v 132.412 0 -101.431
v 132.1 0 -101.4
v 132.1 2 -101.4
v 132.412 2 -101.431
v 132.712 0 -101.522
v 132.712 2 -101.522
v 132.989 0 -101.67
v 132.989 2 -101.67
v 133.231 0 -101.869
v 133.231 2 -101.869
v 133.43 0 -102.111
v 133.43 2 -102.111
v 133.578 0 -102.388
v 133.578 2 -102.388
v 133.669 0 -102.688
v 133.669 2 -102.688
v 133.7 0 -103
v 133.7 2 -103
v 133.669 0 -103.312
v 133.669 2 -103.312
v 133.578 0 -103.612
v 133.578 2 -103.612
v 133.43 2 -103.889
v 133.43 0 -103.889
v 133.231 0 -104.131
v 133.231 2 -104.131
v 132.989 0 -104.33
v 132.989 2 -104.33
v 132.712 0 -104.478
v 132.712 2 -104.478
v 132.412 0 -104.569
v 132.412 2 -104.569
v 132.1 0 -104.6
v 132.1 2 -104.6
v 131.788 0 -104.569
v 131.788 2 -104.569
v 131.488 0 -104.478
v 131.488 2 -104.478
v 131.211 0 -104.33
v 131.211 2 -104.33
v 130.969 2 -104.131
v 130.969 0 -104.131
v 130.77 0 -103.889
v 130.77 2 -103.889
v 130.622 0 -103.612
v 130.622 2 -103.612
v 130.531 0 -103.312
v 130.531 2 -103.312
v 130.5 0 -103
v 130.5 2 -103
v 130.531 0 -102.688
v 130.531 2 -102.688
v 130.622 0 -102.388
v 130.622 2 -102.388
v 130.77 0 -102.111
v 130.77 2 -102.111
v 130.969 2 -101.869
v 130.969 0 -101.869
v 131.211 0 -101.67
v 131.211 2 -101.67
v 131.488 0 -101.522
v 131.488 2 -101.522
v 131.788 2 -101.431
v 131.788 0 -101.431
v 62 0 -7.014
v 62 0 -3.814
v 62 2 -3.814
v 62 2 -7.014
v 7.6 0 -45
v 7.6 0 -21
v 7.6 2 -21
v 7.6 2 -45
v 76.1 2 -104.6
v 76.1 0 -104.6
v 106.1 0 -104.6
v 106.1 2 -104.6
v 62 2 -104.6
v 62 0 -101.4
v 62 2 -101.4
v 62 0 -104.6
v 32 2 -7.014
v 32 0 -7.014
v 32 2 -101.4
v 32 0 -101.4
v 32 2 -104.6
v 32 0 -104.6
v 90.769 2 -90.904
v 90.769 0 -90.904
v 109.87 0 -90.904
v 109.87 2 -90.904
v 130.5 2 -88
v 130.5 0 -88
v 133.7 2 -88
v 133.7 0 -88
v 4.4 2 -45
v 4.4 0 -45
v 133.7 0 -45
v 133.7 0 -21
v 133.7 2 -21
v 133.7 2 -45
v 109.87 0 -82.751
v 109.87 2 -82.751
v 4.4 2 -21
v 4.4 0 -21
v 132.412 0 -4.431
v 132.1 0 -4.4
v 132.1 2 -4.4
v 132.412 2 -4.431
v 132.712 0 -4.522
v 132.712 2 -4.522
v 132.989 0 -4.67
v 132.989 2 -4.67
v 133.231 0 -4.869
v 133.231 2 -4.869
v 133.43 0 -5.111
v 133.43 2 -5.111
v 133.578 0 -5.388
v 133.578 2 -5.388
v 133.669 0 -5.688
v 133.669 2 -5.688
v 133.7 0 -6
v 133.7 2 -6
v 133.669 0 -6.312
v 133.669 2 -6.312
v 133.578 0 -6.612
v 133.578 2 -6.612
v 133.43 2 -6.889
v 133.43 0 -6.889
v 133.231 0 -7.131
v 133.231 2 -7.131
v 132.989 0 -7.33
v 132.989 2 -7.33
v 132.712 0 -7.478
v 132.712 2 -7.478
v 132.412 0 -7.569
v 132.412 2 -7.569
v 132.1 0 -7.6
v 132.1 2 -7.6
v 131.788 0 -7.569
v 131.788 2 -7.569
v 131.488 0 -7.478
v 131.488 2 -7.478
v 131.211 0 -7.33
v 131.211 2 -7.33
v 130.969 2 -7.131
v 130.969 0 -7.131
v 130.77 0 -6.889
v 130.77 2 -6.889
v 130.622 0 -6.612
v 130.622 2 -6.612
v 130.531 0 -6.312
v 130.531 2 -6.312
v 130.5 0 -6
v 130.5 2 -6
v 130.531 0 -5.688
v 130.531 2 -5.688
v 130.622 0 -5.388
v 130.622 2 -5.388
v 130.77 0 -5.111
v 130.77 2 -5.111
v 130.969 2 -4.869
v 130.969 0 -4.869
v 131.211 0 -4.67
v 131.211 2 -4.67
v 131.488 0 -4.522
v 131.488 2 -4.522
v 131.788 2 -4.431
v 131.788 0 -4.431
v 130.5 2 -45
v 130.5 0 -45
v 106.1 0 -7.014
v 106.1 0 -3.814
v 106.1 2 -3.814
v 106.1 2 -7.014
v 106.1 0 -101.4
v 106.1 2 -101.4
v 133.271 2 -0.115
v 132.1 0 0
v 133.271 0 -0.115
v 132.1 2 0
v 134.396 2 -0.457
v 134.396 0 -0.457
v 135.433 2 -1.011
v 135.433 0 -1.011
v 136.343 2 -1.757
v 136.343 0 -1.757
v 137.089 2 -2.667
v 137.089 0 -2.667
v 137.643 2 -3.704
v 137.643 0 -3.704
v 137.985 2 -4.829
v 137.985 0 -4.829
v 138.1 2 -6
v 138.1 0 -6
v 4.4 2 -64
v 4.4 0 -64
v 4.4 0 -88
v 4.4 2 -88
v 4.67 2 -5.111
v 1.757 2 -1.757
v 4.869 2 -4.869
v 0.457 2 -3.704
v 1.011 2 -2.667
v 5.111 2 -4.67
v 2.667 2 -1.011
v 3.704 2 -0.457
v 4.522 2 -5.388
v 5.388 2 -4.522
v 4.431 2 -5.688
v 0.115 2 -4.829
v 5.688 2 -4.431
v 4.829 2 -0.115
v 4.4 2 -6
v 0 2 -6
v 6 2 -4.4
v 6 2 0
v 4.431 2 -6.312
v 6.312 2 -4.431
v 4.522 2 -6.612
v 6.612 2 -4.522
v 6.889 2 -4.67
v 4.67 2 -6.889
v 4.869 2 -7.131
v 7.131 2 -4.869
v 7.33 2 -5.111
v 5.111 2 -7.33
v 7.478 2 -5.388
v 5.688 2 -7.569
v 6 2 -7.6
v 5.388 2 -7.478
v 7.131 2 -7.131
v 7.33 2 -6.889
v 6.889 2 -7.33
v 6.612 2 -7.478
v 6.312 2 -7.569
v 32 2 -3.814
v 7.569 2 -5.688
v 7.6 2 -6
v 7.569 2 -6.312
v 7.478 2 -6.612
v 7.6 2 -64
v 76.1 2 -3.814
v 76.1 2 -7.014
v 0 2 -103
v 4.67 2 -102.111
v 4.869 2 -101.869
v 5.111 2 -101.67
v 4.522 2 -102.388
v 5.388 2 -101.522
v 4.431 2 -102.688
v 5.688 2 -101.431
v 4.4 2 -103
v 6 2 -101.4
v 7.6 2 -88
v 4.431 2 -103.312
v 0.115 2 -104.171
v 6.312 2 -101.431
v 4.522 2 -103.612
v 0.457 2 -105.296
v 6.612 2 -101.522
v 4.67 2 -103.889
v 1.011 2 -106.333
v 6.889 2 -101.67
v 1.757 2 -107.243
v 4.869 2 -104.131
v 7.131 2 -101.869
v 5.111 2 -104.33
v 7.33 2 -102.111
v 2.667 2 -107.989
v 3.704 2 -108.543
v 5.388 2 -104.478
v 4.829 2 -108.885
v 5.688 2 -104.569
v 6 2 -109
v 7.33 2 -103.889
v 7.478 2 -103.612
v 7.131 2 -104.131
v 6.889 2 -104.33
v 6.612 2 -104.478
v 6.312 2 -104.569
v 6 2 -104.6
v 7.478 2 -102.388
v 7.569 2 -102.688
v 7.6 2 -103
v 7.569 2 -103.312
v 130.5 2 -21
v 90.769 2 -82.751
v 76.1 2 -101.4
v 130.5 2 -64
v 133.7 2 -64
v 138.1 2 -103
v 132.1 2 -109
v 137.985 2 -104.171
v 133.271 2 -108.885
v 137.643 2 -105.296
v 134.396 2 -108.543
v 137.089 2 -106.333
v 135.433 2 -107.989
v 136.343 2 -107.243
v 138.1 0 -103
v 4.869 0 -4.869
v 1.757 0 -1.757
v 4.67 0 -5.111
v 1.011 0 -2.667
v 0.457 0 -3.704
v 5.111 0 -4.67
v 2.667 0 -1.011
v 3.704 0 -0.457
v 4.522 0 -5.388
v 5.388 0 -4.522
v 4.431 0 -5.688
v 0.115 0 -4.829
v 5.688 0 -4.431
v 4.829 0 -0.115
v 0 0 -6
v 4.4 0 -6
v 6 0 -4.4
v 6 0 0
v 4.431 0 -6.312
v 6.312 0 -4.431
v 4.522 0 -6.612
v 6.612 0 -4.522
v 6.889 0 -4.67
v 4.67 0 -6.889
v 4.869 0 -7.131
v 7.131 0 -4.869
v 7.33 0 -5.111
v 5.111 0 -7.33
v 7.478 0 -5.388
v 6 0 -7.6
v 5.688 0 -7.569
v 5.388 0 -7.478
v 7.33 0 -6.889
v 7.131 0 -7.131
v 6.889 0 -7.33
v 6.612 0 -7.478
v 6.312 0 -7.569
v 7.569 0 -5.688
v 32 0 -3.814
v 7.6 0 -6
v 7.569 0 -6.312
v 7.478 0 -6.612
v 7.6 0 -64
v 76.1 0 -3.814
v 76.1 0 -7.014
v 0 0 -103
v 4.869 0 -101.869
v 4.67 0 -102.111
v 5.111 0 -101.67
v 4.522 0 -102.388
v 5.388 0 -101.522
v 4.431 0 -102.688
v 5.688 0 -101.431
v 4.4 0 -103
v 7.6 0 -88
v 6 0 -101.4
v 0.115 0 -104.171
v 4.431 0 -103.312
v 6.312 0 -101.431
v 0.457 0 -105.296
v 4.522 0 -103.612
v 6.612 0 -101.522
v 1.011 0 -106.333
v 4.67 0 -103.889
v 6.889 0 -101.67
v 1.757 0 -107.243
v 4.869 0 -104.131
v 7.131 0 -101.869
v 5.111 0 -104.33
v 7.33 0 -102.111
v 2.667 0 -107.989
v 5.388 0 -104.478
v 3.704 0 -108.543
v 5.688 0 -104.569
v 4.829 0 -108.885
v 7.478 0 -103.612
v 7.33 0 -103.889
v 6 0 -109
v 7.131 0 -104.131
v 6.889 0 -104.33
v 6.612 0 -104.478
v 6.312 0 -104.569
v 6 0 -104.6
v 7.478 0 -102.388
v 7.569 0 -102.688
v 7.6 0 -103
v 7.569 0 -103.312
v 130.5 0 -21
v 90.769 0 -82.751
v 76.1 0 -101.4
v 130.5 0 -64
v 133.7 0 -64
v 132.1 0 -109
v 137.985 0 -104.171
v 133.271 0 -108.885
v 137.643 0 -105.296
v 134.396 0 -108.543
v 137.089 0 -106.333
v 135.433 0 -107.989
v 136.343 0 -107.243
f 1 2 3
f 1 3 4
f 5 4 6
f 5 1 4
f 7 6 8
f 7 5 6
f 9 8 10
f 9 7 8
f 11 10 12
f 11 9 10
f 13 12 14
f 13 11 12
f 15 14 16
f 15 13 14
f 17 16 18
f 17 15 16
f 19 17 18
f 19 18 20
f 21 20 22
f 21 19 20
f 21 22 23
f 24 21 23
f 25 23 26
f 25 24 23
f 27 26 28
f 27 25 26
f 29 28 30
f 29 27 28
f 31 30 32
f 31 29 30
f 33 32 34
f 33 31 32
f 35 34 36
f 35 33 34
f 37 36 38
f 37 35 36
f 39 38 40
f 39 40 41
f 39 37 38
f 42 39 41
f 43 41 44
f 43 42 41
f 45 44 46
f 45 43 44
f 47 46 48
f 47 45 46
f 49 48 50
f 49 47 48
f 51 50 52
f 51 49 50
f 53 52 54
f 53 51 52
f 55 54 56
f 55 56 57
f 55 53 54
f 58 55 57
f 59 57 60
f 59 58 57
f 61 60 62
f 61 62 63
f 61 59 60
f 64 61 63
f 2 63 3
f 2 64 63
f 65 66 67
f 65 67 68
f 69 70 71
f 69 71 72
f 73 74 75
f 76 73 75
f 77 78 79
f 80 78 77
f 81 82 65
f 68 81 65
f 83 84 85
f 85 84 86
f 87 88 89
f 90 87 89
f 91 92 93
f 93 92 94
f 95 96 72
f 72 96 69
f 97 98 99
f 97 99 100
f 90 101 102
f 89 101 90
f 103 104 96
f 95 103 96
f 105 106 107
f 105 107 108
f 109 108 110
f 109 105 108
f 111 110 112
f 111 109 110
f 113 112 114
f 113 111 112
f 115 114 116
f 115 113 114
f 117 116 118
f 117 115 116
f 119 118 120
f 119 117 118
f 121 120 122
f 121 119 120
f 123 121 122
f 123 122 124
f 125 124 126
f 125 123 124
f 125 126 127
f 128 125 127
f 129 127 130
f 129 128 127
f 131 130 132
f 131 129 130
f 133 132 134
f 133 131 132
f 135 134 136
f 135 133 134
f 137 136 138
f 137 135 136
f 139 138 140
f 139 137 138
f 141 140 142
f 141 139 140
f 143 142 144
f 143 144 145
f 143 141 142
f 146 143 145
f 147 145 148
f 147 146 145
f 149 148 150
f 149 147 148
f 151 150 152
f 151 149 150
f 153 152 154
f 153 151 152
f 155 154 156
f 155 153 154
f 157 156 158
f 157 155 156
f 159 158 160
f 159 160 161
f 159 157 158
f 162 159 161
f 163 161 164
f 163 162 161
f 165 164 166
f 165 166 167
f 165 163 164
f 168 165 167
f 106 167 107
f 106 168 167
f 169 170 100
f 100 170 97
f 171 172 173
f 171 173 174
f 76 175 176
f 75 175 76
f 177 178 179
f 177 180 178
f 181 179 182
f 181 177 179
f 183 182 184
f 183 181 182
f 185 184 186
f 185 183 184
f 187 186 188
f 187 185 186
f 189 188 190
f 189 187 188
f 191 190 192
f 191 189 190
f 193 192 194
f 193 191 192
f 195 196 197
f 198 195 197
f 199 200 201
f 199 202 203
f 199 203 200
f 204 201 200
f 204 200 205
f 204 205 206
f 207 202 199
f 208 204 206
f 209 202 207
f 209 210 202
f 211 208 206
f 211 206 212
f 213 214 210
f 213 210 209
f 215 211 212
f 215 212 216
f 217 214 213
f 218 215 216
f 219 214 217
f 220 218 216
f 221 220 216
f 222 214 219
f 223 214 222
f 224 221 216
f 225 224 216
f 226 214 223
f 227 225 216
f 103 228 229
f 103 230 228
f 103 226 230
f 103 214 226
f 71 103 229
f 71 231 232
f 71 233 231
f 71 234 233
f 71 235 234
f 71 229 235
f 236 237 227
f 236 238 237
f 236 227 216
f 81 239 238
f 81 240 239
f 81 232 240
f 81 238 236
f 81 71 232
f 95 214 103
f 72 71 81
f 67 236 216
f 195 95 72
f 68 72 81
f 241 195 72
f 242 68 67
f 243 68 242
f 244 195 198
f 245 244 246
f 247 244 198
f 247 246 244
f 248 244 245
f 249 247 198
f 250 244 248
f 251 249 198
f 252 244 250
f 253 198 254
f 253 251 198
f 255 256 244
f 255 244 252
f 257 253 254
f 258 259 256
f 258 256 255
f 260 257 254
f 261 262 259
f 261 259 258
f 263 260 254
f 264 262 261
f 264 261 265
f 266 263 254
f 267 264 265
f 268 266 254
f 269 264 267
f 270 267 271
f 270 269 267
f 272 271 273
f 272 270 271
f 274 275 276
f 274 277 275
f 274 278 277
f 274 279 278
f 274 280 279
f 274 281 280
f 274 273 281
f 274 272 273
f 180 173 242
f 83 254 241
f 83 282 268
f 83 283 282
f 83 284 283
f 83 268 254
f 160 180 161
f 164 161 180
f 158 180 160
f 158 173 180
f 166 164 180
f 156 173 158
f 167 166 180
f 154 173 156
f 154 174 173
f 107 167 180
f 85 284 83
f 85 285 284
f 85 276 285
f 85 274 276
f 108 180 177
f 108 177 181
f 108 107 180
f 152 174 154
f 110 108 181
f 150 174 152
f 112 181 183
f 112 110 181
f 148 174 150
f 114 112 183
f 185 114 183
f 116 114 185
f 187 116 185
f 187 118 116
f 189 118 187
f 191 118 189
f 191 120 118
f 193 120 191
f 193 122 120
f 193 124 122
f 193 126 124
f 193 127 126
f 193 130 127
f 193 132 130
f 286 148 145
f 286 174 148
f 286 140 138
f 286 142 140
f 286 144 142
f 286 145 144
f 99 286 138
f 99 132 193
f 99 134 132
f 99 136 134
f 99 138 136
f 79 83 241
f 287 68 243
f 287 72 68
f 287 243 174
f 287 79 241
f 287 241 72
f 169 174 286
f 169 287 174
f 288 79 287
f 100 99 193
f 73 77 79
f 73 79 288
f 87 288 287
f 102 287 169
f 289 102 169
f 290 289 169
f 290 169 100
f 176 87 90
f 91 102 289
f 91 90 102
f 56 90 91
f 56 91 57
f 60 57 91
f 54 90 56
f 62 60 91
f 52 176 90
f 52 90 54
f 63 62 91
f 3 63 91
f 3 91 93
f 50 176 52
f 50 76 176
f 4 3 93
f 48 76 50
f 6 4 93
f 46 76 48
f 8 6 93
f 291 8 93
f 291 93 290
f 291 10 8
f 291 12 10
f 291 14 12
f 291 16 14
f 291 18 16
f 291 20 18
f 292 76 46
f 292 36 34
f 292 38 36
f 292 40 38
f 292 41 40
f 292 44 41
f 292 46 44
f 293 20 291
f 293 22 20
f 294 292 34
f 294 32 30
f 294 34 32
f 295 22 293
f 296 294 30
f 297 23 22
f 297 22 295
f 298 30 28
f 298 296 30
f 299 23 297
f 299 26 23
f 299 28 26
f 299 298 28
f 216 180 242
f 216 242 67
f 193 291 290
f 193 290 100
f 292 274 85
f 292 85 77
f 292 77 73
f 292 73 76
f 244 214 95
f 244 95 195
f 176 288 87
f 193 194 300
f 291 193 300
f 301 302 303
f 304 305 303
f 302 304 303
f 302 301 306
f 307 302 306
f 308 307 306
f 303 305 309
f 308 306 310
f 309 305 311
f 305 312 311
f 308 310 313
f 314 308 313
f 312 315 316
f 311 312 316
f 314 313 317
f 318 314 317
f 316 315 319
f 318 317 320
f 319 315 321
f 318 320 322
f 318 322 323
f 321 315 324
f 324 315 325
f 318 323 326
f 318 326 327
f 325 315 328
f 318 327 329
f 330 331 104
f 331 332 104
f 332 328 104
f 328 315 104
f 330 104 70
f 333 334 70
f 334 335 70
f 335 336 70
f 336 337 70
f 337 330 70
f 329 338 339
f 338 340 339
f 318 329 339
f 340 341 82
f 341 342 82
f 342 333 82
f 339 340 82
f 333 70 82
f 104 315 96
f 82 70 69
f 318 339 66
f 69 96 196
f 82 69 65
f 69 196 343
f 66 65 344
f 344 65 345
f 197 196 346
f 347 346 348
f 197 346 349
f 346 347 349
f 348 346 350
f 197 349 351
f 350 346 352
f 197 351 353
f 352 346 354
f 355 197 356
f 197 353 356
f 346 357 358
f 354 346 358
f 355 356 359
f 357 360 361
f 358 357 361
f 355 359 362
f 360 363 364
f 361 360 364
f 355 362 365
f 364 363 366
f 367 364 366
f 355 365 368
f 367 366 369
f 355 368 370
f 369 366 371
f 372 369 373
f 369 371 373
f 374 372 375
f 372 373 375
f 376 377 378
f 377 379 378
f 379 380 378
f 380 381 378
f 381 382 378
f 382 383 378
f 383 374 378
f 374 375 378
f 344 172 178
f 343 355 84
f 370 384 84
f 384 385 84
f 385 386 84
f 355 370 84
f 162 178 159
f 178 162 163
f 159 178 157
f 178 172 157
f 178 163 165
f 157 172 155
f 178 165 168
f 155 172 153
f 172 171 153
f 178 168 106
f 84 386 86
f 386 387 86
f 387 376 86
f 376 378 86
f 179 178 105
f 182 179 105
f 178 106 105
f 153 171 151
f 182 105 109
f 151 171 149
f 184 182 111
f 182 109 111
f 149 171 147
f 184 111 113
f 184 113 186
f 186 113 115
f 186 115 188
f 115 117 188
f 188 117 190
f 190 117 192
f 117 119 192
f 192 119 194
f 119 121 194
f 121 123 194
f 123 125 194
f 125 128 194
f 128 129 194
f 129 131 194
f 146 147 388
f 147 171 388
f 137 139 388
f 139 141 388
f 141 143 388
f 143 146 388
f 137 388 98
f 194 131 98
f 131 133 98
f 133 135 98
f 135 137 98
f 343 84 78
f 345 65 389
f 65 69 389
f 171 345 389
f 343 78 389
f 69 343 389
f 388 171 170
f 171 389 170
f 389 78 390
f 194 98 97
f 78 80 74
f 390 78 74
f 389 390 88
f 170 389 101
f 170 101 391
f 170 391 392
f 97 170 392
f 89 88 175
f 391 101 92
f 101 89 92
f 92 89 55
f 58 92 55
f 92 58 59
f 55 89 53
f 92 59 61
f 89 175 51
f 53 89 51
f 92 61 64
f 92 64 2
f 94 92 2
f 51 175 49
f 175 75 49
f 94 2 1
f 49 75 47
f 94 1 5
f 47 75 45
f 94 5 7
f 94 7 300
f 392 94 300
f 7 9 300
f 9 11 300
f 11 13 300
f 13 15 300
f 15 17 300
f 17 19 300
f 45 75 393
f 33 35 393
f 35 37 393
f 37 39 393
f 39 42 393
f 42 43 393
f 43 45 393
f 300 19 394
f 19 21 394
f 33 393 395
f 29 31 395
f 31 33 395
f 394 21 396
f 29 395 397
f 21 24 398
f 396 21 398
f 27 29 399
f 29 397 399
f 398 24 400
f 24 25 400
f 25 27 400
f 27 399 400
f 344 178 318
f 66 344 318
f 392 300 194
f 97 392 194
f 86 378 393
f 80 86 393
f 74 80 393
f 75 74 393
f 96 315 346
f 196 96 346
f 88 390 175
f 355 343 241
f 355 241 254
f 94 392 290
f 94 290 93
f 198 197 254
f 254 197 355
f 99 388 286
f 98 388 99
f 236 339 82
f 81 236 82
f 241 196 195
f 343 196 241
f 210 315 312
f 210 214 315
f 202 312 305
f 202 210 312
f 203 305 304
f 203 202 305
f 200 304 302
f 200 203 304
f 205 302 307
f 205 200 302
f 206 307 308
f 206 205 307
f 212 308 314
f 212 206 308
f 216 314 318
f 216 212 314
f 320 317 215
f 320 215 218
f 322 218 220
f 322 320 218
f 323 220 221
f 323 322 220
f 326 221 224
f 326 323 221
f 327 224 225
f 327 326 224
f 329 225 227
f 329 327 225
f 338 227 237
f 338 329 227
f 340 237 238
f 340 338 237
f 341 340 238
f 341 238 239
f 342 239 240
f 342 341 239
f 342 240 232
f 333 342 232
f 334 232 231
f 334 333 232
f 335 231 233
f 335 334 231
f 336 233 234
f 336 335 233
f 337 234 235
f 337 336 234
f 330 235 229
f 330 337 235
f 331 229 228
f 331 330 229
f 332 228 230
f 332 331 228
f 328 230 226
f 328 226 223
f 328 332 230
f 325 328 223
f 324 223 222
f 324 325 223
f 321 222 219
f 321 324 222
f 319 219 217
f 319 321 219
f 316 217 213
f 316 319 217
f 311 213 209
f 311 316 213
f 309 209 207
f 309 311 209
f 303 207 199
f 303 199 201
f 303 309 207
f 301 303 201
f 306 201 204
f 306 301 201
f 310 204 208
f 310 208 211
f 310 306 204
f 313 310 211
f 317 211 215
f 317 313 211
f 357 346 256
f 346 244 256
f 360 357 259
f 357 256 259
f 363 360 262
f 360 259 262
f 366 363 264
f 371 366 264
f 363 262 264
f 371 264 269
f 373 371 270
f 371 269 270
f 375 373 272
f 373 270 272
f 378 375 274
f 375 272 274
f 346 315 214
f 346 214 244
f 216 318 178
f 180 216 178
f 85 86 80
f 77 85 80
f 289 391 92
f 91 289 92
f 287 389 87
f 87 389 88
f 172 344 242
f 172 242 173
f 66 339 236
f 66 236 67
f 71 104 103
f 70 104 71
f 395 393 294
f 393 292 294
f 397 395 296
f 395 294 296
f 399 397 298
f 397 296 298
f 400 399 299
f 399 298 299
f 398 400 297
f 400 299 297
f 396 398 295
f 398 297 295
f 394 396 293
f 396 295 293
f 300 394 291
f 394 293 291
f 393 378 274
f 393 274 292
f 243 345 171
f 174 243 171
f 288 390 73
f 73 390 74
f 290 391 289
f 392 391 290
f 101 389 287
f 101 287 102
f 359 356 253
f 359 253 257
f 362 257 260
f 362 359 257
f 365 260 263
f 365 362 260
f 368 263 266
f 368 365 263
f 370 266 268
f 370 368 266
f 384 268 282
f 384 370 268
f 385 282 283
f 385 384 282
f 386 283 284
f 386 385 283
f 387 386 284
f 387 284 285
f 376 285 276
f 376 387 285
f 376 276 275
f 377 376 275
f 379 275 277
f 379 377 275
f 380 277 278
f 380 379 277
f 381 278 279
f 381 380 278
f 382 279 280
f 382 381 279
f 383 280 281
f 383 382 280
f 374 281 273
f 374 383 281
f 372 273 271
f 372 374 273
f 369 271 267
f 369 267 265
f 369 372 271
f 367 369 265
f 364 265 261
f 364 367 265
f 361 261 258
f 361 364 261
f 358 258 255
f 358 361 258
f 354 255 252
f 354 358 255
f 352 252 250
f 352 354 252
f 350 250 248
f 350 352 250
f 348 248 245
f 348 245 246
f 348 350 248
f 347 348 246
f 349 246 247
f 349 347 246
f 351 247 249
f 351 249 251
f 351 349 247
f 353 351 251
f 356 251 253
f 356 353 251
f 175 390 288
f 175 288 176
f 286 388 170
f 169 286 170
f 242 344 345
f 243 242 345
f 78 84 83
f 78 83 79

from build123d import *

# Parameters (mm, degrees)
SKETCH1_W           = 138.1
SKETCH1_H           = 109
SKETCH1_R           = 1.6
SKETCH1_W_2         = 30
SKETCH1_H_2         = 3.2
SKETCH1_W_3         = 3.2
SKETCH1_H_3         = 24
SKETCH1_W_4         = 19.101
SKETCH1_H_4         = 8.153
BOSS_EXTRUDE1_DEPTH = 2
FILLET1_R           = 6
FILLET2_R           = 6
FILLET3_R           = 6


with BuildPart() as part:
    # Sketch1 → Boss-Extrude1 (new body)
    with BuildSketch(Plane(origin=(0, 0, 0), x_dir=(1, 0, 0), z_dir=(0, 1, 0))):
        with Locations((69.05, 54.5)):
            Rectangle(SKETCH1_W, SKETCH1_H)
        with Locations(Location((6, 103, 0), (0, 0, 270))):
            Circle(SKETCH1_R, mode=Mode.SUBTRACT)
        with Locations(Location((132.1, 103, 0), (0, 0, 270))):
            Circle(SKETCH1_R, mode=Mode.SUBTRACT)
        with Locations(Location((132.1, 6, 0), (0, 0, 270))):
            Circle(SKETCH1_R, mode=Mode.SUBTRACT)
        with Locations(Location((6, 6, 0), (0, 0, 270))):
            Circle(SKETCH1_R, mode=Mode.SUBTRACT)
        with Locations((47, 5.414130674)):
            Rectangle(SKETCH1_W_2, SKETCH1_H_2, mode=Mode.SUBTRACT)
        with Locations((47, 103)):
            Rectangle(SKETCH1_W_2, SKETCH1_H_2, mode=Mode.SUBTRACT)
        with Locations((91.1, 103)):
            Rectangle(SKETCH1_W_2, SKETCH1_H_2, mode=Mode.SUBTRACT)
        with Locations((91.1, 5.414130674)):
            Rectangle(SKETCH1_W_2, SKETCH1_H_2, mode=Mode.SUBTRACT)
        with Locations((6, 76)):
            Rectangle(SKETCH1_W_3, SKETCH1_H_3, mode=Mode.SUBTRACT)
        with Locations((6, 33)):
            Rectangle(SKETCH1_W_3, SKETCH1_H_3, mode=Mode.SUBTRACT)
        with Locations((132.1, 76)):
            Rectangle(SKETCH1_W_3, SKETCH1_H_3, mode=Mode.SUBTRACT)
        with Locations((132.1, 33)):
            Rectangle(SKETCH1_W_3, SKETCH1_H_3, mode=Mode.SUBTRACT)
        with Locations((100.3195, 86.8275)):
            Rectangle(SKETCH1_W_4, SKETCH1_H_4, mode=Mode.SUBTRACT)
    extrude(amount=BOSS_EXTRUDE1_DEPTH)

    # Fillet1
    fillet1_edges = [part.edges().sort_by_distance(p)[0] for p in [
        (0, 1, -109),
    ]]
    fillet(fillet1_edges, radius=FILLET1_R)

    # Fillet2
    fillet2_edges = [part.edges().sort_by_distance(p)[0] for p in [
        (0, 1, 0),
    ]]
    fillet(fillet2_edges, radius=FILLET2_R)

    # Fillet3
    fillet3_edges = [part.edges().sort_by_distance(p)[0] for p in [
        (138.1, 1, -109),
        (138.1, 1, 0),
    ]]
    fillet(fillet3_edges, radius=FILLET3_R)


solid = part.part
